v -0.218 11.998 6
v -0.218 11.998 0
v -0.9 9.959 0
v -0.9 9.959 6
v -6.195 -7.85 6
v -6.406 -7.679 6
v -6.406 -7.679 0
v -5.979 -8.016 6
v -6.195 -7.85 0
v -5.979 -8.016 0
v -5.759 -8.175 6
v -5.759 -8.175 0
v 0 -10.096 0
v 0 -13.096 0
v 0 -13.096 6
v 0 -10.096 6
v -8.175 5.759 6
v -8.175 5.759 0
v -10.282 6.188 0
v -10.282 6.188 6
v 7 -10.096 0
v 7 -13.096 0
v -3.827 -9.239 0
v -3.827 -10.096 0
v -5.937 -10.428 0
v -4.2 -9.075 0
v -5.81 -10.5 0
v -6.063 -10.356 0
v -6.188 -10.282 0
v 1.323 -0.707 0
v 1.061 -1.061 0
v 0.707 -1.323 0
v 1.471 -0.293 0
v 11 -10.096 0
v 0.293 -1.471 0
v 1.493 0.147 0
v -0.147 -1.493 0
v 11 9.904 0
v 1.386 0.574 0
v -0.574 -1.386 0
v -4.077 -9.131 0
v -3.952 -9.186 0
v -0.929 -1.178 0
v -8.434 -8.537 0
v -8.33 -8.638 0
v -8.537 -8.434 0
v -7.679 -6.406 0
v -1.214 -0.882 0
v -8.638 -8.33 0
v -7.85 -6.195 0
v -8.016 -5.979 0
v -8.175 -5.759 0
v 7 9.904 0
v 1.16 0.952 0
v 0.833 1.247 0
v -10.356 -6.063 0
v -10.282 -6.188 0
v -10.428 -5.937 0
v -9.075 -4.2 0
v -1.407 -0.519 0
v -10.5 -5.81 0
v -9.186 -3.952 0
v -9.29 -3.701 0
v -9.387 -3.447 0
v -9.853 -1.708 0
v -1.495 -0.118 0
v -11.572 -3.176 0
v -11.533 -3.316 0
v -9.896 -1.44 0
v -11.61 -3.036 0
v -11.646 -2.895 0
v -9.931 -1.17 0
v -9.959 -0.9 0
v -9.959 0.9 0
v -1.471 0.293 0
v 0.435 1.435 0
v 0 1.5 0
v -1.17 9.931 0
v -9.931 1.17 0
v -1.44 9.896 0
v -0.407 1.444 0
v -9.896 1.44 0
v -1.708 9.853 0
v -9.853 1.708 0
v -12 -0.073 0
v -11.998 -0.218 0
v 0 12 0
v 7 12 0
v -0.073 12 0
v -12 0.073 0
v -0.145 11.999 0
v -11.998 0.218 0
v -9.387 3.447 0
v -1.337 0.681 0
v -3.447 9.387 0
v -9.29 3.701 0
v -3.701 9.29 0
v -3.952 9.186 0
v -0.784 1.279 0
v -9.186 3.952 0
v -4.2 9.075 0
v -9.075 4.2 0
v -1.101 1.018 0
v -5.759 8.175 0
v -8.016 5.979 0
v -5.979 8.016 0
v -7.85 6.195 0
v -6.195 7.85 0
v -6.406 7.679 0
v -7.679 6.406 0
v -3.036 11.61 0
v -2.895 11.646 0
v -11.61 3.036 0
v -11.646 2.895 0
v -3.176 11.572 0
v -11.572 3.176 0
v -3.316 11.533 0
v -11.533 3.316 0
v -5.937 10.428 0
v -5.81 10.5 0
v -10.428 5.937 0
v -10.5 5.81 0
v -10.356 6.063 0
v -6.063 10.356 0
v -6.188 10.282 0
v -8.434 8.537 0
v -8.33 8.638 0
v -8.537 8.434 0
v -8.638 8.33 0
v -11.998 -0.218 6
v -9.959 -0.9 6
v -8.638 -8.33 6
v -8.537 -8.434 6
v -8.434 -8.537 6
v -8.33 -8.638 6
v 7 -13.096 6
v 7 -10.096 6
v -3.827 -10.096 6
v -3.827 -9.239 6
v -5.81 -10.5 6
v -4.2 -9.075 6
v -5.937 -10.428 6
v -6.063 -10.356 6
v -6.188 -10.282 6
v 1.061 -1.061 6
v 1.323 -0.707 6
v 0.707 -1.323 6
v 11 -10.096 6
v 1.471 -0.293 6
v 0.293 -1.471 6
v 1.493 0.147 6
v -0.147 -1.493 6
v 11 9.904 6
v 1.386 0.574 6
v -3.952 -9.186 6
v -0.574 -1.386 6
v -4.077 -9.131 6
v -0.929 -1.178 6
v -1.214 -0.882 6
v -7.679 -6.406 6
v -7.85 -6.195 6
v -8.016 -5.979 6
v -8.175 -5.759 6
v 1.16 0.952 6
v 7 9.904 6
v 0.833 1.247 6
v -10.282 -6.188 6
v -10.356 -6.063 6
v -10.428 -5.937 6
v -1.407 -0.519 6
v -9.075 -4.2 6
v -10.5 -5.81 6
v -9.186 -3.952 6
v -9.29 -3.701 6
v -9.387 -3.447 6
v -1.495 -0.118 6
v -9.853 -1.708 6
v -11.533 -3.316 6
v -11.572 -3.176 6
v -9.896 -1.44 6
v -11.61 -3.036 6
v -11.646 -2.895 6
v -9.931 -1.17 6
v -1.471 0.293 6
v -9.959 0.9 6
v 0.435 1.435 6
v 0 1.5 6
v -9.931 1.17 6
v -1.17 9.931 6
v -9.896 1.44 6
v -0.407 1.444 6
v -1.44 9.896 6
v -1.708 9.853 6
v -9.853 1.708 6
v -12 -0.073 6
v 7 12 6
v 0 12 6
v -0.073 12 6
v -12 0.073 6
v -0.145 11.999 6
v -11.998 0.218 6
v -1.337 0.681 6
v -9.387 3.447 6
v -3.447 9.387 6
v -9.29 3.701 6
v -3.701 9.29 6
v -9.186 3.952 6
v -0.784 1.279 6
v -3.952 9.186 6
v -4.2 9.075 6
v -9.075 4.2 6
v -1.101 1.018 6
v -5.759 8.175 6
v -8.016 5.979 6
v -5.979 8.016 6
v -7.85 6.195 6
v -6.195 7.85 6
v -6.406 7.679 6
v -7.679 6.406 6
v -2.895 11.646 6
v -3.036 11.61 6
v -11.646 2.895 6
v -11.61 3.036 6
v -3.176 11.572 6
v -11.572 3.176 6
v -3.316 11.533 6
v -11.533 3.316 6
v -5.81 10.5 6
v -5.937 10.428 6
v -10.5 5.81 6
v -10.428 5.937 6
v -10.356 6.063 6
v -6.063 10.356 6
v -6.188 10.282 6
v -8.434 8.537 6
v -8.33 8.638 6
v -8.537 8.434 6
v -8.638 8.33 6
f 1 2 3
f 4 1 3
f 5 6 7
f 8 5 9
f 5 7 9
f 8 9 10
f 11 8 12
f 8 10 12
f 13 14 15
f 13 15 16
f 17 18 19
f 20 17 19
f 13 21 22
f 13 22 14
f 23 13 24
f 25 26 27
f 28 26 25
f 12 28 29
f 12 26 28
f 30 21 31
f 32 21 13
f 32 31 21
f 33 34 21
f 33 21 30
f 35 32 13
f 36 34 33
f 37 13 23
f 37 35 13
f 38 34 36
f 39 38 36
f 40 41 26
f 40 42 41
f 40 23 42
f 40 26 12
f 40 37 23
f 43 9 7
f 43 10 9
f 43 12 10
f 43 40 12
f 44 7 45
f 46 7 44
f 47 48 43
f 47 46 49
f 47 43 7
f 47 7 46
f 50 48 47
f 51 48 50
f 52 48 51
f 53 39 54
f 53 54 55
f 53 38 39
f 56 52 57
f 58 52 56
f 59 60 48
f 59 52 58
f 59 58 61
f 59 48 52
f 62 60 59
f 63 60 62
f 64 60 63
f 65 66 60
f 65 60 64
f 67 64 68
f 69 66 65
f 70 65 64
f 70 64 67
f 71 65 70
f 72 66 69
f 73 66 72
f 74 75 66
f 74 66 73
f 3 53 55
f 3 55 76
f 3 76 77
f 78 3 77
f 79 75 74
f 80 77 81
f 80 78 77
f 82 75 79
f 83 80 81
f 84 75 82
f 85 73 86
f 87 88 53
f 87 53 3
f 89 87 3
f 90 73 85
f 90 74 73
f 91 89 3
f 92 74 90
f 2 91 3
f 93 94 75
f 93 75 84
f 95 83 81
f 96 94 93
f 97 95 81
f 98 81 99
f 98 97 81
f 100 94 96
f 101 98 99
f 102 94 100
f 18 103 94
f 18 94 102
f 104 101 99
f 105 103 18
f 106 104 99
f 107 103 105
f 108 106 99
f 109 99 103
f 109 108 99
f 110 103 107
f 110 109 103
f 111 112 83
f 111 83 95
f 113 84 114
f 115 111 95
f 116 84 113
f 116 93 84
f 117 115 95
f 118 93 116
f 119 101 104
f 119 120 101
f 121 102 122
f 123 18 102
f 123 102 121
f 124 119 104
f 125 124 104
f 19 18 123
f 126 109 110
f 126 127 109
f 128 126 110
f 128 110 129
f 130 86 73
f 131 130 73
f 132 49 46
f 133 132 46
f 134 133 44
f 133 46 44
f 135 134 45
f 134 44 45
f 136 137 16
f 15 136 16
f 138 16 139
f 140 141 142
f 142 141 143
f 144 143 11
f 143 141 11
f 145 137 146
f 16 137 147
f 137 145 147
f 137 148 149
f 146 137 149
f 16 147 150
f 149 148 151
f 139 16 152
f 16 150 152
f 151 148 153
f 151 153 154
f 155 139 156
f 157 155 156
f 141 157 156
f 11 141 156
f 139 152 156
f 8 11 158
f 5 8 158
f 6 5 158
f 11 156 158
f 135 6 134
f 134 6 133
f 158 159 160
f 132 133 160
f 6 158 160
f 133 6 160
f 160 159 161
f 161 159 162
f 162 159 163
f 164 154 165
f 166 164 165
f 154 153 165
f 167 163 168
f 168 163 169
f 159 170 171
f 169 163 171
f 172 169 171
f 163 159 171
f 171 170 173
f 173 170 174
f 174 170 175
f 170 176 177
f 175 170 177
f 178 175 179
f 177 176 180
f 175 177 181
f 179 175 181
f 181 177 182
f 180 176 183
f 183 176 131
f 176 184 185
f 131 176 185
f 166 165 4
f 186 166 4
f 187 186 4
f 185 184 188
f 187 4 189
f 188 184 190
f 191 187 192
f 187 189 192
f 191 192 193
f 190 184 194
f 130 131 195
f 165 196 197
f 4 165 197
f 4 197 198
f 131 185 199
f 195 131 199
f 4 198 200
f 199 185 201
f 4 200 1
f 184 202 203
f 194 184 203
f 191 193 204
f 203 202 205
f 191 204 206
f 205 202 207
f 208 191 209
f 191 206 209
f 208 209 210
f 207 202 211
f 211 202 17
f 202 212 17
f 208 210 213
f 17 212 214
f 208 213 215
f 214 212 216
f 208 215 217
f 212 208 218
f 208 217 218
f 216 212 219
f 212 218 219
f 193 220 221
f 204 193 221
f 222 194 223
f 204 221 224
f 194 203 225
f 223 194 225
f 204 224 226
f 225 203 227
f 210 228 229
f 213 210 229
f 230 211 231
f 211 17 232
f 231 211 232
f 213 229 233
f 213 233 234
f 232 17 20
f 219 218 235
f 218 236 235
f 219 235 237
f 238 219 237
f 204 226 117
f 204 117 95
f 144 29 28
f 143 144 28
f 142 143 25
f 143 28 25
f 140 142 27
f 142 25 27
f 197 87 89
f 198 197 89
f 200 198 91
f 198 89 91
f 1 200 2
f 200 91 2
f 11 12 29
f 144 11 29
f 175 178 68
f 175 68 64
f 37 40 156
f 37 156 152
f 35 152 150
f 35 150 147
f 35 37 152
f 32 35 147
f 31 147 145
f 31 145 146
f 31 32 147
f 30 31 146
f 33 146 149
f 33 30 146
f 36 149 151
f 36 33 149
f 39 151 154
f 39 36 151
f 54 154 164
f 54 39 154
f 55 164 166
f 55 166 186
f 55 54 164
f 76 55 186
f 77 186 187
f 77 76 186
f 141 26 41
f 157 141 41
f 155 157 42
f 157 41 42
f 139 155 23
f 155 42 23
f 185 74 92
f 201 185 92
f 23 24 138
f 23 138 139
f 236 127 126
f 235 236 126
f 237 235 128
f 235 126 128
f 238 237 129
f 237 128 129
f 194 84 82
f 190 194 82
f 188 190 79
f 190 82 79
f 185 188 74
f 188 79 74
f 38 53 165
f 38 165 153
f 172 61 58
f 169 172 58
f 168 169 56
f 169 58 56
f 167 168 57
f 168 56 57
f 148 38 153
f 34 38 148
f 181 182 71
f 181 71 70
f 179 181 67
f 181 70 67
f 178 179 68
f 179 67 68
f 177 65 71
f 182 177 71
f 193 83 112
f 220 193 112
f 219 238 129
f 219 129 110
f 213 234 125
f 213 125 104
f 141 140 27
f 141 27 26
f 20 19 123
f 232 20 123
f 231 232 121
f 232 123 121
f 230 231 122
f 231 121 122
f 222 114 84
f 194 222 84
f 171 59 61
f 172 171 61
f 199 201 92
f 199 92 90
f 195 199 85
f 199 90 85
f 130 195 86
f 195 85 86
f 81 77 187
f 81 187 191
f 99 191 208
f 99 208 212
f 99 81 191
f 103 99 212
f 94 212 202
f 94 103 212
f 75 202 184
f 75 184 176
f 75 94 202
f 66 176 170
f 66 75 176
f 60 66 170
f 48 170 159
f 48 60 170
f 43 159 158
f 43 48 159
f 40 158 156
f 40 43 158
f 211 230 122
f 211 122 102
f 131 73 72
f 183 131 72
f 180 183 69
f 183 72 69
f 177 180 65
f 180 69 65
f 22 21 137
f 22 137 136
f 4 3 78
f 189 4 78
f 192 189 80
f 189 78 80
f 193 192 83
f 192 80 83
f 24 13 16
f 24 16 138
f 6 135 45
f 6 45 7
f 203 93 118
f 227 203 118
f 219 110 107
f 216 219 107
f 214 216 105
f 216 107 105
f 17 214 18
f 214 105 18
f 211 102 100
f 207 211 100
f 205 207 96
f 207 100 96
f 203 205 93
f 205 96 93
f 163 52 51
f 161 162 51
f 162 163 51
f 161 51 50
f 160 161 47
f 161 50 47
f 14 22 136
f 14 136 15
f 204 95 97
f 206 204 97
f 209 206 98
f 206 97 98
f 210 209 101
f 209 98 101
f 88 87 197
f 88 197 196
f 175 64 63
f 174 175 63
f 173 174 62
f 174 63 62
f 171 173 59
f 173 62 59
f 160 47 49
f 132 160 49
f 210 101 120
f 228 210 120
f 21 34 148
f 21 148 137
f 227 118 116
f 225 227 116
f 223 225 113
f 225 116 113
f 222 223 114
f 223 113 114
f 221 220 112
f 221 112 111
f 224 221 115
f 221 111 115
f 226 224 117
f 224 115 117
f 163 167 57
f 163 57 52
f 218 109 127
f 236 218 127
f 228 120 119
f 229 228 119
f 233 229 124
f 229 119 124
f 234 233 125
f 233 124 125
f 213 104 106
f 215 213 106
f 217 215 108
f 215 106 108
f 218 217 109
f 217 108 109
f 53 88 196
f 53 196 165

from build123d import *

# Parameters (mm, degrees)
SKETCH1_R           = 10
BOSS_EXTRUDE1_DEPTH = 6
BOSS_EXTRUDE2_DEPTH = 6
CIRPATTERN1_COUNT   = 24
SKETCH3_R           = 12.65
SKETCH3_R_2         = 12
CUT_EXTRUDE1_DEPTH  = 6
CUT_EXTRUDE2_DEPTH  = 6
SKETCH5_R           = 1.5
CUT_EXTRUDE3_DEPTH  = 6
BOSS_EXTRUDE3_DEPTH = 6


with BuildPart() as part:
    # Sketch1 → Boss-Extrude1 (new body)
    with BuildSketch(Plane.XY):
        Circle(SKETCH1_R)
    extrude(amount=BOSS_EXTRUDE1_DEPTH)

    # Sketch2 → Boss-Extrude2 (add)
    with BuildSketch(Plane.XY):
        with BuildLine():
            Line((0, 12.65), (-0.9, 9.959417654))
            ThreePointArc((-0.9, 9.959417654), (0, 10), (0.9, 9.959417654))
            Line((0.9, 9.959417654), (0, 12.65))
        make_face()
    boss_extrude2 = extrude(amount=BOSS_EXTRUDE2_DEPTH)

    # CirPattern1: Boss-Extrude2 ×24 about axis
    cirpattern1_axis = Axis((0, 0, 0), (0, 0, 1))
    for i in range(1, CIRPATTERN1_COUNT):
        add(boss_extrude2.rotate(cirpattern1_axis, i * 360 / CIRPATTERN1_COUNT))

    # Sketch3 → Cut-Extrude1 (cut)
    with BuildSketch(Plane.XY):
        Circle(SKETCH3_R)
        Circle(SKETCH3_R_2, mode=Mode.SUBTRACT)
    extrude(amount=CUT_EXTRUDE1_DEPTH, mode=Mode.SUBTRACT)

    # Sketch4 → Cut-Extrude2 (cut)
    with BuildSketch(Plane.XY):
        with BuildLine():
            Line((0, 0), (0, 12))
            ThreePointArc((0, 12), (11.769423365, -2.341083864), (-4.592201188, -11.08655439))
            Line((-4.592201188, -11.08655439), (-3.826834324, -9.238795325))
            Line((-3.826834324, -9.238795325), (0, 0))
        make_face()
    extrude(amount=CUT_EXTRUDE2_DEPTH, mode=Mode.SUBTRACT)

    # Sketch5 → Cut-Extrude3 (cut)
    with BuildSketch(Plane.XY):
        Circle(SKETCH5_R)
    extrude(amount=CUT_EXTRUDE3_DEPTH, mode=Mode.SUBTRACT)

    # Sketch6 → Boss-Extrude3 (add)
    with BuildSketch(Plane.XY):
        with BuildLine():
            Line((0, 1.5), (0, 12))
            Line((0, 12), (7, 12))
            Line((7, 12), (7, 9.904493766))
            Line((7, 9.904493766), (11, 9.904493766))
            Line((11, 9.904493766), (11, -10.095506234))
            Line((11, -10.095506234), (7, -10.095506234))
            Line((7, -10.095506234), (7, -13.095506234))
            Line((7, -13.095506234), (0, -13.095506234))
            Line((0, -13.095506234), (0, -10.095506234))
            Line((0, -10.095506234), (-3.826834324, -10.095506234))
            Line((-3.826834324, -10.095506234), (-3.826834324, -9.238795325))
            Line((-3.826834324, -9.238795325), (-0.574025149, -1.385819299))
            ThreePointArc((-0.574025149, -1.385819299), (1.471177921, -0.292635483), (0, 1.5))
        make_face()
    extrude(amount=BOSS_EXTRUDE3_DEPTH)


solid = part.part
